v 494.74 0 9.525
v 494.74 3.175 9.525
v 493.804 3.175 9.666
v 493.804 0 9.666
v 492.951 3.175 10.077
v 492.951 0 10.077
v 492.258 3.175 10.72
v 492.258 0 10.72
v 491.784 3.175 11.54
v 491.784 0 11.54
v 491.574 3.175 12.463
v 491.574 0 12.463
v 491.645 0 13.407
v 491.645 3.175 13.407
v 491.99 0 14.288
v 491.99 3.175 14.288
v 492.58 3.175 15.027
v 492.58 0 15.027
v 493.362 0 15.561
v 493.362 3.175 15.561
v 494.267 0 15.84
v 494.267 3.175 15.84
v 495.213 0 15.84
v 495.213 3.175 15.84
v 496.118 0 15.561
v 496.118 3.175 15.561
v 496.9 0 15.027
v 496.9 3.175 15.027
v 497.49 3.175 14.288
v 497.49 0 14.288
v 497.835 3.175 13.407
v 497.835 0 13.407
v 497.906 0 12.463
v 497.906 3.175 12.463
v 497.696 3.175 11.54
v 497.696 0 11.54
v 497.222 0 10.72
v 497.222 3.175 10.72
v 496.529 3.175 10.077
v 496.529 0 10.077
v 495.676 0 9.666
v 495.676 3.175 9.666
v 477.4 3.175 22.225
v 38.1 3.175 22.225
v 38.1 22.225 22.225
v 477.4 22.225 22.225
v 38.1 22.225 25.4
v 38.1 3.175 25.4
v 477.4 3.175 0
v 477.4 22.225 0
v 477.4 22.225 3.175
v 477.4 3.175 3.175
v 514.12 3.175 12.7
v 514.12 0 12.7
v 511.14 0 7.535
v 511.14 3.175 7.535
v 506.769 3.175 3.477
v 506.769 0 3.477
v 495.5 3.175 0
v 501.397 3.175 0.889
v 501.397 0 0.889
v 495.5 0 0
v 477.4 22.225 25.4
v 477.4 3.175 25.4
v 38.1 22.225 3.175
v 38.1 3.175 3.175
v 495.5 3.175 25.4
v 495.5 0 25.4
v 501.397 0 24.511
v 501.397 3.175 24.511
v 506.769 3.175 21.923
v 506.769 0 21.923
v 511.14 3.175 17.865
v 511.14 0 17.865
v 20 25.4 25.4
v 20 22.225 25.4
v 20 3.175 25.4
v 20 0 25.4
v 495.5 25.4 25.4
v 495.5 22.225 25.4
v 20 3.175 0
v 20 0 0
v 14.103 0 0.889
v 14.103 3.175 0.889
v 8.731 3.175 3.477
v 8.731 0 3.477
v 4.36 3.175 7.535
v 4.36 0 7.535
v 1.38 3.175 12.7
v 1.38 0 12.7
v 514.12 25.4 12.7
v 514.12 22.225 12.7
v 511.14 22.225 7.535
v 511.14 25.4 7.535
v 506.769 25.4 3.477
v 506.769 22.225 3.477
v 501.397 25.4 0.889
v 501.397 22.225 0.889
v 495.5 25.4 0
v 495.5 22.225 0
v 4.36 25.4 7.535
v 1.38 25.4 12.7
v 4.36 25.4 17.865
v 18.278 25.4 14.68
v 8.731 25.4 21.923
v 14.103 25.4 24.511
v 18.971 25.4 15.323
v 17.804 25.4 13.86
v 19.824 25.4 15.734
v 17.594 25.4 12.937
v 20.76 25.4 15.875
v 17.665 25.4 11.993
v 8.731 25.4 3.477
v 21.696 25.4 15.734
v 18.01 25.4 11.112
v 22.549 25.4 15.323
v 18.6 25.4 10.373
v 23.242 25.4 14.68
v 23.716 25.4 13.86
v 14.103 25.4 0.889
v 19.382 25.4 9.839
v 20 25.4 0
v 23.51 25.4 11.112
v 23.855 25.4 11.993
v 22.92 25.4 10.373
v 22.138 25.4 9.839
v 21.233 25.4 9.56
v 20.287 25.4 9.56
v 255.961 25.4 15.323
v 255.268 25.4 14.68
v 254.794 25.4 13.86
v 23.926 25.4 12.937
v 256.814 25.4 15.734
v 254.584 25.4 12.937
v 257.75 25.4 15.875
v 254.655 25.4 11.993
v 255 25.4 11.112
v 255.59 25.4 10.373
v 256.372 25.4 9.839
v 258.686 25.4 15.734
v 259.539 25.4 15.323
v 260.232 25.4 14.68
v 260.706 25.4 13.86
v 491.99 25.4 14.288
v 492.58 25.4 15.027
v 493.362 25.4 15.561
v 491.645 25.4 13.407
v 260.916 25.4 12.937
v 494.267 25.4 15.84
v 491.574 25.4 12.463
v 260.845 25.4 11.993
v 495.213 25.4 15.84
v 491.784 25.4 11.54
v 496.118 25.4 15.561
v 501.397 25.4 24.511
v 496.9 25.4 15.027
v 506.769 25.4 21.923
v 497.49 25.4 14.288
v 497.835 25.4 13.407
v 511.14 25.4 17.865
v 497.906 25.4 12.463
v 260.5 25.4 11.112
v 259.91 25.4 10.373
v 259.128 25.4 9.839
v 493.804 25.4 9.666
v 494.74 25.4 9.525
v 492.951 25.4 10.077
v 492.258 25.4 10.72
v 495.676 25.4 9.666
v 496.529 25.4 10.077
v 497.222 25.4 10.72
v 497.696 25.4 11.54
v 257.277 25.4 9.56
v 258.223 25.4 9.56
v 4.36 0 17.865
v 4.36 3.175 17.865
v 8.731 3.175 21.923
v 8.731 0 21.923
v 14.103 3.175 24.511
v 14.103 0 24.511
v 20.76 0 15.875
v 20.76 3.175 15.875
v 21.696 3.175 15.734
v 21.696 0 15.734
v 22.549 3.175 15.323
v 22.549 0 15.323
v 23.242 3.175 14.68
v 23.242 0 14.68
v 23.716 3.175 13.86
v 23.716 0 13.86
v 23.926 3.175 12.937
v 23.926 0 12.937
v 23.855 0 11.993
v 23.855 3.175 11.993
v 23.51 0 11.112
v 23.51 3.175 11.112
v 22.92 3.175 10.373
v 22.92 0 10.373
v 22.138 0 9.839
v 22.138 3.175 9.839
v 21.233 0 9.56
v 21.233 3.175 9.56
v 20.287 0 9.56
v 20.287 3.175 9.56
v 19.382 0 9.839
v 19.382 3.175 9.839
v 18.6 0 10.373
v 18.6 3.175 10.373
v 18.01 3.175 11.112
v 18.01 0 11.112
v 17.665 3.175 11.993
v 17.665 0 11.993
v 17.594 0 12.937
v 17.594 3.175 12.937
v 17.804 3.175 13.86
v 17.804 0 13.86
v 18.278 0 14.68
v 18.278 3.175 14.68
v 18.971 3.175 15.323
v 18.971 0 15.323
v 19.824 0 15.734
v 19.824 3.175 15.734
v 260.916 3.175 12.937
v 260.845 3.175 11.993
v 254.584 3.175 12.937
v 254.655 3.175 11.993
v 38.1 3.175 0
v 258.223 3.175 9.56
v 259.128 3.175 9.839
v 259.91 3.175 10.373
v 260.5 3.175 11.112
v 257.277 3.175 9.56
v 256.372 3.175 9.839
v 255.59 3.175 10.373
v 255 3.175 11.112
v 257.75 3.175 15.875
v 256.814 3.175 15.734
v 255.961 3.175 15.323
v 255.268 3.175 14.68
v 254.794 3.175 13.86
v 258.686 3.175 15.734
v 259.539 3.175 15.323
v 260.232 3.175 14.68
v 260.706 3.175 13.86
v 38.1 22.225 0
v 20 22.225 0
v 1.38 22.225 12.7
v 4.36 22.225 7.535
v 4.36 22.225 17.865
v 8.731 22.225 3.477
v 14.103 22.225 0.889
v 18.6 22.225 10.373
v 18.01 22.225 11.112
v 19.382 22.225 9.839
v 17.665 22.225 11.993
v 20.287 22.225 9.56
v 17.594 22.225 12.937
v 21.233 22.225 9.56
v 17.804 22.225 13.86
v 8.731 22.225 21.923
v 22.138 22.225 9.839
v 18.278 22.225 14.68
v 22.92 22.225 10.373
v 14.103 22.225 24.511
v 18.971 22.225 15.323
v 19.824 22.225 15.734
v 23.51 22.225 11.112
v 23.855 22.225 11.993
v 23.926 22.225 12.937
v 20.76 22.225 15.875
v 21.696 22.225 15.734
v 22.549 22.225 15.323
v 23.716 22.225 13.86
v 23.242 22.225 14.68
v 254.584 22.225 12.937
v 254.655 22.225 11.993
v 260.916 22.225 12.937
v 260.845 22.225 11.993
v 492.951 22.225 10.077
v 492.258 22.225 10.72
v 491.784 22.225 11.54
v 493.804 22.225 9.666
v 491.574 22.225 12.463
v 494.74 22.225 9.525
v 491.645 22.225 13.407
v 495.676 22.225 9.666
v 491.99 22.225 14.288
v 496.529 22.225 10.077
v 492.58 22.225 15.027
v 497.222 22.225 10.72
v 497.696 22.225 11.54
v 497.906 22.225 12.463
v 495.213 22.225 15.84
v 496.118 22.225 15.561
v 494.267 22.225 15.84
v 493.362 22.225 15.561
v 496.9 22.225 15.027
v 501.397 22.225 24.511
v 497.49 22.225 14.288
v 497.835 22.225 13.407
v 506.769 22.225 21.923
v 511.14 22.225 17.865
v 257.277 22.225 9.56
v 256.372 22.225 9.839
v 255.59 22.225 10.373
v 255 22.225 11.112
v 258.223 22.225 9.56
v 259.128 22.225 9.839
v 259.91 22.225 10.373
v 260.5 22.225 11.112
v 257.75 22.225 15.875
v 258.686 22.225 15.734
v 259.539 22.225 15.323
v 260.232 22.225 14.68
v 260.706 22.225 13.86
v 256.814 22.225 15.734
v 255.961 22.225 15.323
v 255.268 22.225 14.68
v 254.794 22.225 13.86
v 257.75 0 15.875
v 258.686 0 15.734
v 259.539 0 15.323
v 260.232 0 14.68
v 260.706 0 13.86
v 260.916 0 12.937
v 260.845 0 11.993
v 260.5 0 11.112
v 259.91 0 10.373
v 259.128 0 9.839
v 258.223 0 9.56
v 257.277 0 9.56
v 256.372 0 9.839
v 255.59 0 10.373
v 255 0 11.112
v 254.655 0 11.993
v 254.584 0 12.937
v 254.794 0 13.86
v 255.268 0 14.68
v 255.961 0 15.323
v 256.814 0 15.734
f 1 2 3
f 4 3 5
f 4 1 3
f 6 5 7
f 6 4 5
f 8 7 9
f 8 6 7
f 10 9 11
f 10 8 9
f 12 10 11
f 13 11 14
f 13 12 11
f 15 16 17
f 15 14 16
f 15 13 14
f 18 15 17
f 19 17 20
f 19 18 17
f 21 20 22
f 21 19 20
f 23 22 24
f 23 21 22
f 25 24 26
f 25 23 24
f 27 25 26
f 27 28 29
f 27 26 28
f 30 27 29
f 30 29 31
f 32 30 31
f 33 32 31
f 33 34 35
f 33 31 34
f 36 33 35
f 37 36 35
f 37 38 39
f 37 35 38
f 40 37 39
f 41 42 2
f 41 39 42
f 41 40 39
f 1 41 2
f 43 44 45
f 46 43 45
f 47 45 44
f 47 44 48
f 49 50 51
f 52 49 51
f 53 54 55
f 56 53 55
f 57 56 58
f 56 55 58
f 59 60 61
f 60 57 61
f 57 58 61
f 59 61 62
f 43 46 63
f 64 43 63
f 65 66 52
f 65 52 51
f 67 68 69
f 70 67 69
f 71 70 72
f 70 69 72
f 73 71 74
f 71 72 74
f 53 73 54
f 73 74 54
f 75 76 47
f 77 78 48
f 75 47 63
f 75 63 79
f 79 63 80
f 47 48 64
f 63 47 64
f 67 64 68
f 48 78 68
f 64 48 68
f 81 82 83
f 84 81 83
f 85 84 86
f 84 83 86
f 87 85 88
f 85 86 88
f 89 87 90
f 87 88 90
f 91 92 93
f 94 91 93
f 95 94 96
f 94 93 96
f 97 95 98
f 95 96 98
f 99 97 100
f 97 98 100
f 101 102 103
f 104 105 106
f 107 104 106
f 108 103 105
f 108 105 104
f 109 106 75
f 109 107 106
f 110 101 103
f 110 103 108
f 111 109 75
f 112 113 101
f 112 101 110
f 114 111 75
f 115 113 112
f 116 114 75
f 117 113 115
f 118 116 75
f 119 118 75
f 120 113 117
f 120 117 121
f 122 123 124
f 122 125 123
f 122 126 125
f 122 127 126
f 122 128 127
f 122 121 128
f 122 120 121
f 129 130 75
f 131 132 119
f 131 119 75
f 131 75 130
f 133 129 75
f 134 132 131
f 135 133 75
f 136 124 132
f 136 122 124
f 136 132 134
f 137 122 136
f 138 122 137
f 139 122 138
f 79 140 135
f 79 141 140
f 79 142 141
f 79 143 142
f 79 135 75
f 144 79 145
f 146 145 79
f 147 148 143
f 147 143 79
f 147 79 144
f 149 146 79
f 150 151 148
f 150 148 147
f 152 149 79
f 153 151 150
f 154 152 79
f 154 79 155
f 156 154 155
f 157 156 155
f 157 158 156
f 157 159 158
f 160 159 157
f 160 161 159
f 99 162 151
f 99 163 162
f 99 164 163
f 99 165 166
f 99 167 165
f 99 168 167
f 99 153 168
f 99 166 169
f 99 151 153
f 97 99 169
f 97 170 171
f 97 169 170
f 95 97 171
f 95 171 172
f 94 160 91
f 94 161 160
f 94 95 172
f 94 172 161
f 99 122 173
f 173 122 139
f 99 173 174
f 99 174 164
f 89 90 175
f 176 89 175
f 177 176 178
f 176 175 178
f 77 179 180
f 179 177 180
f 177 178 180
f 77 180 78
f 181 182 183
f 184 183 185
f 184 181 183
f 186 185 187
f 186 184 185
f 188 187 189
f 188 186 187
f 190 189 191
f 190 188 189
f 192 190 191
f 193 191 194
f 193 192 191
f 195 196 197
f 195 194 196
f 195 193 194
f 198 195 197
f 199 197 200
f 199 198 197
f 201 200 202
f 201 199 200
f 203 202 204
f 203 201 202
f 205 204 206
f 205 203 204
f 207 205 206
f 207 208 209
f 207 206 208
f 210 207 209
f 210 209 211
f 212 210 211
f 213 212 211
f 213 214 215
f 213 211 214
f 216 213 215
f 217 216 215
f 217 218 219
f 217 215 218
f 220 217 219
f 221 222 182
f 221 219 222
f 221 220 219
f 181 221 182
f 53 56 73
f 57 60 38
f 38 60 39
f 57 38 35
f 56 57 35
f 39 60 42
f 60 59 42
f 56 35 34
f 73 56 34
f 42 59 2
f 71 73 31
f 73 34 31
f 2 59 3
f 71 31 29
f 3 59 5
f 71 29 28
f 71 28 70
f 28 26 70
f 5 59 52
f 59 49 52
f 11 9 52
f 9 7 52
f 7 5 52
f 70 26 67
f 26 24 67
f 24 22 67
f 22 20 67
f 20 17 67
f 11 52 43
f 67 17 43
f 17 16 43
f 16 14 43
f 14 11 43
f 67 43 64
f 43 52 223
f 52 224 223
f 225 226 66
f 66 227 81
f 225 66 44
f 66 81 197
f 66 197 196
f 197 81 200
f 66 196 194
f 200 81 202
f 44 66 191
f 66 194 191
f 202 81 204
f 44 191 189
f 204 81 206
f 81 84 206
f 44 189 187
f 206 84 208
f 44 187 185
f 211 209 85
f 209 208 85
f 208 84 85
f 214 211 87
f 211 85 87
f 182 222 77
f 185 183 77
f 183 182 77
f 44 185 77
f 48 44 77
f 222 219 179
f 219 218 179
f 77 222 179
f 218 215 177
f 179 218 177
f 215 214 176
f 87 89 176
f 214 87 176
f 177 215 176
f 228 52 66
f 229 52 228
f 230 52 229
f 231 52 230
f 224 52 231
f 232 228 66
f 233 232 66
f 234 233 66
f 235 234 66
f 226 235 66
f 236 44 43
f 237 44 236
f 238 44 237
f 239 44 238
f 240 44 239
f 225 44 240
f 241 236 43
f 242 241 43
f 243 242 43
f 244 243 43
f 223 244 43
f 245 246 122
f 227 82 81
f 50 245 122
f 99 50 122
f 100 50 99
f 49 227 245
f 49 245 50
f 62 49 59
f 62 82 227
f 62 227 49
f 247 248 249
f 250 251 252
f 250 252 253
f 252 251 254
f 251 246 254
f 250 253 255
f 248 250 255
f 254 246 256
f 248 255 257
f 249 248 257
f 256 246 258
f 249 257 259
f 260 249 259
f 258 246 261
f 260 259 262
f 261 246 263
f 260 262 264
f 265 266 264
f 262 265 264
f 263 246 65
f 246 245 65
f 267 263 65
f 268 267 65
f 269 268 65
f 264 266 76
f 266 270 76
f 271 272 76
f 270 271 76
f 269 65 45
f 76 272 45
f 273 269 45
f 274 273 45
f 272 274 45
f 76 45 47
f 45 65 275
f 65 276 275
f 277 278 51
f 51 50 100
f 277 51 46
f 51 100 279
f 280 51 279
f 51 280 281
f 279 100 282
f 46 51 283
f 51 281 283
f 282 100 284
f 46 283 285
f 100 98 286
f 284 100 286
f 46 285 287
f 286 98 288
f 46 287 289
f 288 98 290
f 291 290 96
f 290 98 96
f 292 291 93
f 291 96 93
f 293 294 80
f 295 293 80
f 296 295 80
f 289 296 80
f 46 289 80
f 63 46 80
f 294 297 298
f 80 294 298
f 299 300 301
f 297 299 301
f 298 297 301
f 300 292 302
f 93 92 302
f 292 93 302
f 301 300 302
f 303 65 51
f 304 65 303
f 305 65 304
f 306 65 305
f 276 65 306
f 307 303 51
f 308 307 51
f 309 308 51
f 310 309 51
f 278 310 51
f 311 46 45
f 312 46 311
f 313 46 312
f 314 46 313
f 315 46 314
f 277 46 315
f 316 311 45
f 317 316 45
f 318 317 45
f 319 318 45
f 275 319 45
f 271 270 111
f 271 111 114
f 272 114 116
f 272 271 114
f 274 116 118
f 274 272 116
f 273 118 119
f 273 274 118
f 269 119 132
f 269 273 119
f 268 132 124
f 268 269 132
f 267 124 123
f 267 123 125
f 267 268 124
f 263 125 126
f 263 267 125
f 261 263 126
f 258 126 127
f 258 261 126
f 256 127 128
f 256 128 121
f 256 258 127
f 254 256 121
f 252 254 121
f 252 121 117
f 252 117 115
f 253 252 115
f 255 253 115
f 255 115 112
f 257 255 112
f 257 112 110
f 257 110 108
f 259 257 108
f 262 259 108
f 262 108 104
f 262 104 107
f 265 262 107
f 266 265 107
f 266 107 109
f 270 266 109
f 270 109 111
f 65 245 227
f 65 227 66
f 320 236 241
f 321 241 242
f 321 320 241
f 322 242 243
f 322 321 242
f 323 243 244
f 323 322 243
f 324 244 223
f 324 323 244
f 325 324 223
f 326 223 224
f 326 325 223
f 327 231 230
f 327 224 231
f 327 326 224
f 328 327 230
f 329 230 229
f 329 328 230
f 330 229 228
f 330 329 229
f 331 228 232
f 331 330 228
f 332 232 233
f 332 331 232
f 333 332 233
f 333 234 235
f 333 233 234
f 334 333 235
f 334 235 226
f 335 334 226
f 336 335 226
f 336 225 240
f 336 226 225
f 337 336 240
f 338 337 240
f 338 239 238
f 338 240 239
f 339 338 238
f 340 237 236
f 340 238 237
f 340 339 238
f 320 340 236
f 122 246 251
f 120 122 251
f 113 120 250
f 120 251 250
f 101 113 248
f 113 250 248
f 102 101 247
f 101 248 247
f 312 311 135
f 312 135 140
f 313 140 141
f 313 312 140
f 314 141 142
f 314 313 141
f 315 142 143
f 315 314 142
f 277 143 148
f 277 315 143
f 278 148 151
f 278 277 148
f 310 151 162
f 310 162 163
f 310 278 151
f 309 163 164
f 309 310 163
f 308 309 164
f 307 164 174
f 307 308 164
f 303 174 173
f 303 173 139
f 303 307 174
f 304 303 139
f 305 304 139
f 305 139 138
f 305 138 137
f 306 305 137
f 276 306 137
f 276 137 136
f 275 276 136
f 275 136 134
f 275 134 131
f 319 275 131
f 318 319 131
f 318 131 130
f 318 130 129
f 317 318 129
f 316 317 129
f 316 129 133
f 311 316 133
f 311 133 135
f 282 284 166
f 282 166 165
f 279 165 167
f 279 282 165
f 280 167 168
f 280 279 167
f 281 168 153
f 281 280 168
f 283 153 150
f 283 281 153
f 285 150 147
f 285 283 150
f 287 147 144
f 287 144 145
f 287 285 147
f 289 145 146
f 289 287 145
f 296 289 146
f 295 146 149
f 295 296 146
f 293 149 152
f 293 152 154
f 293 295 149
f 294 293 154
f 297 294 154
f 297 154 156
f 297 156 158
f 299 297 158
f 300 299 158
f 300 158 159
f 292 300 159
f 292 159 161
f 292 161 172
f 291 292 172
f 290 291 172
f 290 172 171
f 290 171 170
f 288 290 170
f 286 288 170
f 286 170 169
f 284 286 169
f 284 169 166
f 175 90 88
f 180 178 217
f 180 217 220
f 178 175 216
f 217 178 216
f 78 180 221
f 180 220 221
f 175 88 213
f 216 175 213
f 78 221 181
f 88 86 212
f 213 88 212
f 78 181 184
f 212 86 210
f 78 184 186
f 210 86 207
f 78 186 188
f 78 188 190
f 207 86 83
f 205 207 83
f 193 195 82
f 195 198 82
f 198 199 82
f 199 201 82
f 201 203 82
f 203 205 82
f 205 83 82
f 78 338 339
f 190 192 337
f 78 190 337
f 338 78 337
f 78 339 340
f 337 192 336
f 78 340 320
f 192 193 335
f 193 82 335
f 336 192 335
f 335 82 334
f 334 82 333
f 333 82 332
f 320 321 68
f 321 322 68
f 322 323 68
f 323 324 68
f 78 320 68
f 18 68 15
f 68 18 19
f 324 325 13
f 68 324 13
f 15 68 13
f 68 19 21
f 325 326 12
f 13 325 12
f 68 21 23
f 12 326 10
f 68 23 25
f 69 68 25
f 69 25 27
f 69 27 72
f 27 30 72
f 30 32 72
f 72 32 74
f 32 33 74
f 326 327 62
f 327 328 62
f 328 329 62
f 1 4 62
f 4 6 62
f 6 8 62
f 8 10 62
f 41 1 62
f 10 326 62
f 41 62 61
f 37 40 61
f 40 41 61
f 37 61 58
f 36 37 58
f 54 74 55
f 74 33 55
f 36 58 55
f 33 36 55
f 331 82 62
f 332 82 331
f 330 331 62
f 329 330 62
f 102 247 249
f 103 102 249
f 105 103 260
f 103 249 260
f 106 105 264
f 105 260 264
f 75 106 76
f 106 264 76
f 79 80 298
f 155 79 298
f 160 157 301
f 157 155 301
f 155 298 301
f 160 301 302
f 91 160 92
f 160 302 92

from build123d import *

# Parameters (mm, degrees)
SKETCH1_W           = 515.5
SKETCH1_H           = 25.4
SKETCH1_R           = 3.175
BOSS_EXTRUDE1_DEPTH = 25.4
CUT_EXTRUDE1_REACH  = 518.75
SKETCH2_W           = 19.05
SKETCH2_H           = 19.05
SKETCH4_W           = 25.4
SKETCH4_H           = 19.05
CUT_EXTRUDE2_DEPTH  = 38.1
FILLET1_R           = 20


with BuildPart() as part:
    # Sketch1 → Boss-Extrude1 (new body)
    with BuildSketch(Plane(origin=(0, 0, 0), x_dir=(1, 0, 0), z_dir=(0, 1, 0))):
        with Locations((257.75, -12.7)):
            Rectangle(SKETCH1_W, SKETCH1_H)
        with Locations(Location((257.75, -12.7, 0), (0, 0, 270))):
            Circle(SKETCH1_R, mode=Mode.SUBTRACT)
        with Locations(Location((20.76, -12.7, 0), (0, 0, 270))):
            Circle(SKETCH1_R, mode=Mode.SUBTRACT)
        with Locations(Location((494.74, -12.7, 0), (0, 0, 90))):
            Circle(SKETCH1_R, mode=Mode.SUBTRACT)
    extrude(amount=BOSS_EXTRUDE1_DEPTH)

    # Cut-Extrude1: up to this face of the body (flat: up to its plane)
    cut_extrude1_end = Plane(part.part.faces().sort_by_distance((515.5, 12.7, 12.7))[0])
    # Sketch2 → Cut-Extrude1 (cut, up to the picked face)
    with BuildSketch(Plane.ZY, mode=Mode.PRIVATE) as cut_extrude1_sk1:
        with Locations((12.7, 12.7)):
            Rectangle(SKETCH2_W, SKETCH2_H)
    cut_extrude1_tool1 = split(extrude(cut_extrude1_sk1.sketch, amount=-CUT_EXTRUDE1_REACH, mode=Mode.PRIVATE), bisect_by=cut_extrude1_end, keep=Keep.BOTH, mode=Mode.PRIVATE)
    add(cut_extrude1_tool1.solids().sort_by(Axis((0, 12.7, 12.7), (1, 0, 0)))[0], mode=Mode.SUBTRACT)

    # Sketch4 → Cut-Extrude2 (cut)
    with BuildSketch(Plane.ZY):
        with Locations((12.7, 12.7)):
            Rectangle(SKETCH4_W, SKETCH4_H)
    cut_extrude2 = extrude(amount=-CUT_EXTRUDE2_DEPTH, mode=Mode.SUBTRACT)

    # Mirror1: Cut-Extrude2 across plane
    add(cut_extrude2.mirror(Plane.ZY.offset(-257.75)), mode=Mode.SUBTRACT)

    # Fillet1
    # the kernel refuses this fillet: 20 mm, written as the material it takes off along each edge
    with BuildSketch(Plane(origin=(515.5, -50, 0), x_dir=(-1, 0, 0), z_dir=(0, 1, 0)), Plane(origin=(515.5, -27.775, 0), x_dir=(-1, 0, 0), z_dir=(0, 1, 0)), Plane(origin=(0, -27.775, 25.4), x_dir=(1, 0, 0), z_dir=(0, 1, 0))) as fillet1_piece_1:
        with BuildLine():
            CenterArc((FILLET1_R, FILLET1_R), FILLET1_R, 180, 90)
            Line((0, FILLET1_R), (0, 0))
            Line((0, 0), (FILLET1_R, 0))
        make_face()
    extrude(amount=103.175, mode=Mode.SUBTRACT)
    with BuildSketch(Plane(origin=(515.5, -50, 25.4), x_dir=(-1, 0, 0), z_dir=(0, 1, 0)), Plane(origin=(515.5, -27.775, 25.4), x_dir=(-1, 0, 0), z_dir=(0, 1, 0)), Plane(origin=(0, -50, 25.4), x_dir=(0, 0, -1), z_dir=(0, 1, 0)), Plane(origin=(0, -50, 0), x_dir=(1, 0, 0), z_dir=(0, 1, 0)), Plane(origin=(0, -27.775, 0), x_dir=(1, 0, 0), z_dir=(0, 1, 0))) as fillet1_piece_2:
        with BuildLine():
            CenterArc((FILLET1_R, -FILLET1_R), FILLET1_R, 90, 90)
            Line((0, -FILLET1_R), (0, 0))
            Line((0, 0), (FILLET1_R, 0))
        make_face()
    extrude(amount=103.175, mode=Mode.SUBTRACT)


solid = part.part
